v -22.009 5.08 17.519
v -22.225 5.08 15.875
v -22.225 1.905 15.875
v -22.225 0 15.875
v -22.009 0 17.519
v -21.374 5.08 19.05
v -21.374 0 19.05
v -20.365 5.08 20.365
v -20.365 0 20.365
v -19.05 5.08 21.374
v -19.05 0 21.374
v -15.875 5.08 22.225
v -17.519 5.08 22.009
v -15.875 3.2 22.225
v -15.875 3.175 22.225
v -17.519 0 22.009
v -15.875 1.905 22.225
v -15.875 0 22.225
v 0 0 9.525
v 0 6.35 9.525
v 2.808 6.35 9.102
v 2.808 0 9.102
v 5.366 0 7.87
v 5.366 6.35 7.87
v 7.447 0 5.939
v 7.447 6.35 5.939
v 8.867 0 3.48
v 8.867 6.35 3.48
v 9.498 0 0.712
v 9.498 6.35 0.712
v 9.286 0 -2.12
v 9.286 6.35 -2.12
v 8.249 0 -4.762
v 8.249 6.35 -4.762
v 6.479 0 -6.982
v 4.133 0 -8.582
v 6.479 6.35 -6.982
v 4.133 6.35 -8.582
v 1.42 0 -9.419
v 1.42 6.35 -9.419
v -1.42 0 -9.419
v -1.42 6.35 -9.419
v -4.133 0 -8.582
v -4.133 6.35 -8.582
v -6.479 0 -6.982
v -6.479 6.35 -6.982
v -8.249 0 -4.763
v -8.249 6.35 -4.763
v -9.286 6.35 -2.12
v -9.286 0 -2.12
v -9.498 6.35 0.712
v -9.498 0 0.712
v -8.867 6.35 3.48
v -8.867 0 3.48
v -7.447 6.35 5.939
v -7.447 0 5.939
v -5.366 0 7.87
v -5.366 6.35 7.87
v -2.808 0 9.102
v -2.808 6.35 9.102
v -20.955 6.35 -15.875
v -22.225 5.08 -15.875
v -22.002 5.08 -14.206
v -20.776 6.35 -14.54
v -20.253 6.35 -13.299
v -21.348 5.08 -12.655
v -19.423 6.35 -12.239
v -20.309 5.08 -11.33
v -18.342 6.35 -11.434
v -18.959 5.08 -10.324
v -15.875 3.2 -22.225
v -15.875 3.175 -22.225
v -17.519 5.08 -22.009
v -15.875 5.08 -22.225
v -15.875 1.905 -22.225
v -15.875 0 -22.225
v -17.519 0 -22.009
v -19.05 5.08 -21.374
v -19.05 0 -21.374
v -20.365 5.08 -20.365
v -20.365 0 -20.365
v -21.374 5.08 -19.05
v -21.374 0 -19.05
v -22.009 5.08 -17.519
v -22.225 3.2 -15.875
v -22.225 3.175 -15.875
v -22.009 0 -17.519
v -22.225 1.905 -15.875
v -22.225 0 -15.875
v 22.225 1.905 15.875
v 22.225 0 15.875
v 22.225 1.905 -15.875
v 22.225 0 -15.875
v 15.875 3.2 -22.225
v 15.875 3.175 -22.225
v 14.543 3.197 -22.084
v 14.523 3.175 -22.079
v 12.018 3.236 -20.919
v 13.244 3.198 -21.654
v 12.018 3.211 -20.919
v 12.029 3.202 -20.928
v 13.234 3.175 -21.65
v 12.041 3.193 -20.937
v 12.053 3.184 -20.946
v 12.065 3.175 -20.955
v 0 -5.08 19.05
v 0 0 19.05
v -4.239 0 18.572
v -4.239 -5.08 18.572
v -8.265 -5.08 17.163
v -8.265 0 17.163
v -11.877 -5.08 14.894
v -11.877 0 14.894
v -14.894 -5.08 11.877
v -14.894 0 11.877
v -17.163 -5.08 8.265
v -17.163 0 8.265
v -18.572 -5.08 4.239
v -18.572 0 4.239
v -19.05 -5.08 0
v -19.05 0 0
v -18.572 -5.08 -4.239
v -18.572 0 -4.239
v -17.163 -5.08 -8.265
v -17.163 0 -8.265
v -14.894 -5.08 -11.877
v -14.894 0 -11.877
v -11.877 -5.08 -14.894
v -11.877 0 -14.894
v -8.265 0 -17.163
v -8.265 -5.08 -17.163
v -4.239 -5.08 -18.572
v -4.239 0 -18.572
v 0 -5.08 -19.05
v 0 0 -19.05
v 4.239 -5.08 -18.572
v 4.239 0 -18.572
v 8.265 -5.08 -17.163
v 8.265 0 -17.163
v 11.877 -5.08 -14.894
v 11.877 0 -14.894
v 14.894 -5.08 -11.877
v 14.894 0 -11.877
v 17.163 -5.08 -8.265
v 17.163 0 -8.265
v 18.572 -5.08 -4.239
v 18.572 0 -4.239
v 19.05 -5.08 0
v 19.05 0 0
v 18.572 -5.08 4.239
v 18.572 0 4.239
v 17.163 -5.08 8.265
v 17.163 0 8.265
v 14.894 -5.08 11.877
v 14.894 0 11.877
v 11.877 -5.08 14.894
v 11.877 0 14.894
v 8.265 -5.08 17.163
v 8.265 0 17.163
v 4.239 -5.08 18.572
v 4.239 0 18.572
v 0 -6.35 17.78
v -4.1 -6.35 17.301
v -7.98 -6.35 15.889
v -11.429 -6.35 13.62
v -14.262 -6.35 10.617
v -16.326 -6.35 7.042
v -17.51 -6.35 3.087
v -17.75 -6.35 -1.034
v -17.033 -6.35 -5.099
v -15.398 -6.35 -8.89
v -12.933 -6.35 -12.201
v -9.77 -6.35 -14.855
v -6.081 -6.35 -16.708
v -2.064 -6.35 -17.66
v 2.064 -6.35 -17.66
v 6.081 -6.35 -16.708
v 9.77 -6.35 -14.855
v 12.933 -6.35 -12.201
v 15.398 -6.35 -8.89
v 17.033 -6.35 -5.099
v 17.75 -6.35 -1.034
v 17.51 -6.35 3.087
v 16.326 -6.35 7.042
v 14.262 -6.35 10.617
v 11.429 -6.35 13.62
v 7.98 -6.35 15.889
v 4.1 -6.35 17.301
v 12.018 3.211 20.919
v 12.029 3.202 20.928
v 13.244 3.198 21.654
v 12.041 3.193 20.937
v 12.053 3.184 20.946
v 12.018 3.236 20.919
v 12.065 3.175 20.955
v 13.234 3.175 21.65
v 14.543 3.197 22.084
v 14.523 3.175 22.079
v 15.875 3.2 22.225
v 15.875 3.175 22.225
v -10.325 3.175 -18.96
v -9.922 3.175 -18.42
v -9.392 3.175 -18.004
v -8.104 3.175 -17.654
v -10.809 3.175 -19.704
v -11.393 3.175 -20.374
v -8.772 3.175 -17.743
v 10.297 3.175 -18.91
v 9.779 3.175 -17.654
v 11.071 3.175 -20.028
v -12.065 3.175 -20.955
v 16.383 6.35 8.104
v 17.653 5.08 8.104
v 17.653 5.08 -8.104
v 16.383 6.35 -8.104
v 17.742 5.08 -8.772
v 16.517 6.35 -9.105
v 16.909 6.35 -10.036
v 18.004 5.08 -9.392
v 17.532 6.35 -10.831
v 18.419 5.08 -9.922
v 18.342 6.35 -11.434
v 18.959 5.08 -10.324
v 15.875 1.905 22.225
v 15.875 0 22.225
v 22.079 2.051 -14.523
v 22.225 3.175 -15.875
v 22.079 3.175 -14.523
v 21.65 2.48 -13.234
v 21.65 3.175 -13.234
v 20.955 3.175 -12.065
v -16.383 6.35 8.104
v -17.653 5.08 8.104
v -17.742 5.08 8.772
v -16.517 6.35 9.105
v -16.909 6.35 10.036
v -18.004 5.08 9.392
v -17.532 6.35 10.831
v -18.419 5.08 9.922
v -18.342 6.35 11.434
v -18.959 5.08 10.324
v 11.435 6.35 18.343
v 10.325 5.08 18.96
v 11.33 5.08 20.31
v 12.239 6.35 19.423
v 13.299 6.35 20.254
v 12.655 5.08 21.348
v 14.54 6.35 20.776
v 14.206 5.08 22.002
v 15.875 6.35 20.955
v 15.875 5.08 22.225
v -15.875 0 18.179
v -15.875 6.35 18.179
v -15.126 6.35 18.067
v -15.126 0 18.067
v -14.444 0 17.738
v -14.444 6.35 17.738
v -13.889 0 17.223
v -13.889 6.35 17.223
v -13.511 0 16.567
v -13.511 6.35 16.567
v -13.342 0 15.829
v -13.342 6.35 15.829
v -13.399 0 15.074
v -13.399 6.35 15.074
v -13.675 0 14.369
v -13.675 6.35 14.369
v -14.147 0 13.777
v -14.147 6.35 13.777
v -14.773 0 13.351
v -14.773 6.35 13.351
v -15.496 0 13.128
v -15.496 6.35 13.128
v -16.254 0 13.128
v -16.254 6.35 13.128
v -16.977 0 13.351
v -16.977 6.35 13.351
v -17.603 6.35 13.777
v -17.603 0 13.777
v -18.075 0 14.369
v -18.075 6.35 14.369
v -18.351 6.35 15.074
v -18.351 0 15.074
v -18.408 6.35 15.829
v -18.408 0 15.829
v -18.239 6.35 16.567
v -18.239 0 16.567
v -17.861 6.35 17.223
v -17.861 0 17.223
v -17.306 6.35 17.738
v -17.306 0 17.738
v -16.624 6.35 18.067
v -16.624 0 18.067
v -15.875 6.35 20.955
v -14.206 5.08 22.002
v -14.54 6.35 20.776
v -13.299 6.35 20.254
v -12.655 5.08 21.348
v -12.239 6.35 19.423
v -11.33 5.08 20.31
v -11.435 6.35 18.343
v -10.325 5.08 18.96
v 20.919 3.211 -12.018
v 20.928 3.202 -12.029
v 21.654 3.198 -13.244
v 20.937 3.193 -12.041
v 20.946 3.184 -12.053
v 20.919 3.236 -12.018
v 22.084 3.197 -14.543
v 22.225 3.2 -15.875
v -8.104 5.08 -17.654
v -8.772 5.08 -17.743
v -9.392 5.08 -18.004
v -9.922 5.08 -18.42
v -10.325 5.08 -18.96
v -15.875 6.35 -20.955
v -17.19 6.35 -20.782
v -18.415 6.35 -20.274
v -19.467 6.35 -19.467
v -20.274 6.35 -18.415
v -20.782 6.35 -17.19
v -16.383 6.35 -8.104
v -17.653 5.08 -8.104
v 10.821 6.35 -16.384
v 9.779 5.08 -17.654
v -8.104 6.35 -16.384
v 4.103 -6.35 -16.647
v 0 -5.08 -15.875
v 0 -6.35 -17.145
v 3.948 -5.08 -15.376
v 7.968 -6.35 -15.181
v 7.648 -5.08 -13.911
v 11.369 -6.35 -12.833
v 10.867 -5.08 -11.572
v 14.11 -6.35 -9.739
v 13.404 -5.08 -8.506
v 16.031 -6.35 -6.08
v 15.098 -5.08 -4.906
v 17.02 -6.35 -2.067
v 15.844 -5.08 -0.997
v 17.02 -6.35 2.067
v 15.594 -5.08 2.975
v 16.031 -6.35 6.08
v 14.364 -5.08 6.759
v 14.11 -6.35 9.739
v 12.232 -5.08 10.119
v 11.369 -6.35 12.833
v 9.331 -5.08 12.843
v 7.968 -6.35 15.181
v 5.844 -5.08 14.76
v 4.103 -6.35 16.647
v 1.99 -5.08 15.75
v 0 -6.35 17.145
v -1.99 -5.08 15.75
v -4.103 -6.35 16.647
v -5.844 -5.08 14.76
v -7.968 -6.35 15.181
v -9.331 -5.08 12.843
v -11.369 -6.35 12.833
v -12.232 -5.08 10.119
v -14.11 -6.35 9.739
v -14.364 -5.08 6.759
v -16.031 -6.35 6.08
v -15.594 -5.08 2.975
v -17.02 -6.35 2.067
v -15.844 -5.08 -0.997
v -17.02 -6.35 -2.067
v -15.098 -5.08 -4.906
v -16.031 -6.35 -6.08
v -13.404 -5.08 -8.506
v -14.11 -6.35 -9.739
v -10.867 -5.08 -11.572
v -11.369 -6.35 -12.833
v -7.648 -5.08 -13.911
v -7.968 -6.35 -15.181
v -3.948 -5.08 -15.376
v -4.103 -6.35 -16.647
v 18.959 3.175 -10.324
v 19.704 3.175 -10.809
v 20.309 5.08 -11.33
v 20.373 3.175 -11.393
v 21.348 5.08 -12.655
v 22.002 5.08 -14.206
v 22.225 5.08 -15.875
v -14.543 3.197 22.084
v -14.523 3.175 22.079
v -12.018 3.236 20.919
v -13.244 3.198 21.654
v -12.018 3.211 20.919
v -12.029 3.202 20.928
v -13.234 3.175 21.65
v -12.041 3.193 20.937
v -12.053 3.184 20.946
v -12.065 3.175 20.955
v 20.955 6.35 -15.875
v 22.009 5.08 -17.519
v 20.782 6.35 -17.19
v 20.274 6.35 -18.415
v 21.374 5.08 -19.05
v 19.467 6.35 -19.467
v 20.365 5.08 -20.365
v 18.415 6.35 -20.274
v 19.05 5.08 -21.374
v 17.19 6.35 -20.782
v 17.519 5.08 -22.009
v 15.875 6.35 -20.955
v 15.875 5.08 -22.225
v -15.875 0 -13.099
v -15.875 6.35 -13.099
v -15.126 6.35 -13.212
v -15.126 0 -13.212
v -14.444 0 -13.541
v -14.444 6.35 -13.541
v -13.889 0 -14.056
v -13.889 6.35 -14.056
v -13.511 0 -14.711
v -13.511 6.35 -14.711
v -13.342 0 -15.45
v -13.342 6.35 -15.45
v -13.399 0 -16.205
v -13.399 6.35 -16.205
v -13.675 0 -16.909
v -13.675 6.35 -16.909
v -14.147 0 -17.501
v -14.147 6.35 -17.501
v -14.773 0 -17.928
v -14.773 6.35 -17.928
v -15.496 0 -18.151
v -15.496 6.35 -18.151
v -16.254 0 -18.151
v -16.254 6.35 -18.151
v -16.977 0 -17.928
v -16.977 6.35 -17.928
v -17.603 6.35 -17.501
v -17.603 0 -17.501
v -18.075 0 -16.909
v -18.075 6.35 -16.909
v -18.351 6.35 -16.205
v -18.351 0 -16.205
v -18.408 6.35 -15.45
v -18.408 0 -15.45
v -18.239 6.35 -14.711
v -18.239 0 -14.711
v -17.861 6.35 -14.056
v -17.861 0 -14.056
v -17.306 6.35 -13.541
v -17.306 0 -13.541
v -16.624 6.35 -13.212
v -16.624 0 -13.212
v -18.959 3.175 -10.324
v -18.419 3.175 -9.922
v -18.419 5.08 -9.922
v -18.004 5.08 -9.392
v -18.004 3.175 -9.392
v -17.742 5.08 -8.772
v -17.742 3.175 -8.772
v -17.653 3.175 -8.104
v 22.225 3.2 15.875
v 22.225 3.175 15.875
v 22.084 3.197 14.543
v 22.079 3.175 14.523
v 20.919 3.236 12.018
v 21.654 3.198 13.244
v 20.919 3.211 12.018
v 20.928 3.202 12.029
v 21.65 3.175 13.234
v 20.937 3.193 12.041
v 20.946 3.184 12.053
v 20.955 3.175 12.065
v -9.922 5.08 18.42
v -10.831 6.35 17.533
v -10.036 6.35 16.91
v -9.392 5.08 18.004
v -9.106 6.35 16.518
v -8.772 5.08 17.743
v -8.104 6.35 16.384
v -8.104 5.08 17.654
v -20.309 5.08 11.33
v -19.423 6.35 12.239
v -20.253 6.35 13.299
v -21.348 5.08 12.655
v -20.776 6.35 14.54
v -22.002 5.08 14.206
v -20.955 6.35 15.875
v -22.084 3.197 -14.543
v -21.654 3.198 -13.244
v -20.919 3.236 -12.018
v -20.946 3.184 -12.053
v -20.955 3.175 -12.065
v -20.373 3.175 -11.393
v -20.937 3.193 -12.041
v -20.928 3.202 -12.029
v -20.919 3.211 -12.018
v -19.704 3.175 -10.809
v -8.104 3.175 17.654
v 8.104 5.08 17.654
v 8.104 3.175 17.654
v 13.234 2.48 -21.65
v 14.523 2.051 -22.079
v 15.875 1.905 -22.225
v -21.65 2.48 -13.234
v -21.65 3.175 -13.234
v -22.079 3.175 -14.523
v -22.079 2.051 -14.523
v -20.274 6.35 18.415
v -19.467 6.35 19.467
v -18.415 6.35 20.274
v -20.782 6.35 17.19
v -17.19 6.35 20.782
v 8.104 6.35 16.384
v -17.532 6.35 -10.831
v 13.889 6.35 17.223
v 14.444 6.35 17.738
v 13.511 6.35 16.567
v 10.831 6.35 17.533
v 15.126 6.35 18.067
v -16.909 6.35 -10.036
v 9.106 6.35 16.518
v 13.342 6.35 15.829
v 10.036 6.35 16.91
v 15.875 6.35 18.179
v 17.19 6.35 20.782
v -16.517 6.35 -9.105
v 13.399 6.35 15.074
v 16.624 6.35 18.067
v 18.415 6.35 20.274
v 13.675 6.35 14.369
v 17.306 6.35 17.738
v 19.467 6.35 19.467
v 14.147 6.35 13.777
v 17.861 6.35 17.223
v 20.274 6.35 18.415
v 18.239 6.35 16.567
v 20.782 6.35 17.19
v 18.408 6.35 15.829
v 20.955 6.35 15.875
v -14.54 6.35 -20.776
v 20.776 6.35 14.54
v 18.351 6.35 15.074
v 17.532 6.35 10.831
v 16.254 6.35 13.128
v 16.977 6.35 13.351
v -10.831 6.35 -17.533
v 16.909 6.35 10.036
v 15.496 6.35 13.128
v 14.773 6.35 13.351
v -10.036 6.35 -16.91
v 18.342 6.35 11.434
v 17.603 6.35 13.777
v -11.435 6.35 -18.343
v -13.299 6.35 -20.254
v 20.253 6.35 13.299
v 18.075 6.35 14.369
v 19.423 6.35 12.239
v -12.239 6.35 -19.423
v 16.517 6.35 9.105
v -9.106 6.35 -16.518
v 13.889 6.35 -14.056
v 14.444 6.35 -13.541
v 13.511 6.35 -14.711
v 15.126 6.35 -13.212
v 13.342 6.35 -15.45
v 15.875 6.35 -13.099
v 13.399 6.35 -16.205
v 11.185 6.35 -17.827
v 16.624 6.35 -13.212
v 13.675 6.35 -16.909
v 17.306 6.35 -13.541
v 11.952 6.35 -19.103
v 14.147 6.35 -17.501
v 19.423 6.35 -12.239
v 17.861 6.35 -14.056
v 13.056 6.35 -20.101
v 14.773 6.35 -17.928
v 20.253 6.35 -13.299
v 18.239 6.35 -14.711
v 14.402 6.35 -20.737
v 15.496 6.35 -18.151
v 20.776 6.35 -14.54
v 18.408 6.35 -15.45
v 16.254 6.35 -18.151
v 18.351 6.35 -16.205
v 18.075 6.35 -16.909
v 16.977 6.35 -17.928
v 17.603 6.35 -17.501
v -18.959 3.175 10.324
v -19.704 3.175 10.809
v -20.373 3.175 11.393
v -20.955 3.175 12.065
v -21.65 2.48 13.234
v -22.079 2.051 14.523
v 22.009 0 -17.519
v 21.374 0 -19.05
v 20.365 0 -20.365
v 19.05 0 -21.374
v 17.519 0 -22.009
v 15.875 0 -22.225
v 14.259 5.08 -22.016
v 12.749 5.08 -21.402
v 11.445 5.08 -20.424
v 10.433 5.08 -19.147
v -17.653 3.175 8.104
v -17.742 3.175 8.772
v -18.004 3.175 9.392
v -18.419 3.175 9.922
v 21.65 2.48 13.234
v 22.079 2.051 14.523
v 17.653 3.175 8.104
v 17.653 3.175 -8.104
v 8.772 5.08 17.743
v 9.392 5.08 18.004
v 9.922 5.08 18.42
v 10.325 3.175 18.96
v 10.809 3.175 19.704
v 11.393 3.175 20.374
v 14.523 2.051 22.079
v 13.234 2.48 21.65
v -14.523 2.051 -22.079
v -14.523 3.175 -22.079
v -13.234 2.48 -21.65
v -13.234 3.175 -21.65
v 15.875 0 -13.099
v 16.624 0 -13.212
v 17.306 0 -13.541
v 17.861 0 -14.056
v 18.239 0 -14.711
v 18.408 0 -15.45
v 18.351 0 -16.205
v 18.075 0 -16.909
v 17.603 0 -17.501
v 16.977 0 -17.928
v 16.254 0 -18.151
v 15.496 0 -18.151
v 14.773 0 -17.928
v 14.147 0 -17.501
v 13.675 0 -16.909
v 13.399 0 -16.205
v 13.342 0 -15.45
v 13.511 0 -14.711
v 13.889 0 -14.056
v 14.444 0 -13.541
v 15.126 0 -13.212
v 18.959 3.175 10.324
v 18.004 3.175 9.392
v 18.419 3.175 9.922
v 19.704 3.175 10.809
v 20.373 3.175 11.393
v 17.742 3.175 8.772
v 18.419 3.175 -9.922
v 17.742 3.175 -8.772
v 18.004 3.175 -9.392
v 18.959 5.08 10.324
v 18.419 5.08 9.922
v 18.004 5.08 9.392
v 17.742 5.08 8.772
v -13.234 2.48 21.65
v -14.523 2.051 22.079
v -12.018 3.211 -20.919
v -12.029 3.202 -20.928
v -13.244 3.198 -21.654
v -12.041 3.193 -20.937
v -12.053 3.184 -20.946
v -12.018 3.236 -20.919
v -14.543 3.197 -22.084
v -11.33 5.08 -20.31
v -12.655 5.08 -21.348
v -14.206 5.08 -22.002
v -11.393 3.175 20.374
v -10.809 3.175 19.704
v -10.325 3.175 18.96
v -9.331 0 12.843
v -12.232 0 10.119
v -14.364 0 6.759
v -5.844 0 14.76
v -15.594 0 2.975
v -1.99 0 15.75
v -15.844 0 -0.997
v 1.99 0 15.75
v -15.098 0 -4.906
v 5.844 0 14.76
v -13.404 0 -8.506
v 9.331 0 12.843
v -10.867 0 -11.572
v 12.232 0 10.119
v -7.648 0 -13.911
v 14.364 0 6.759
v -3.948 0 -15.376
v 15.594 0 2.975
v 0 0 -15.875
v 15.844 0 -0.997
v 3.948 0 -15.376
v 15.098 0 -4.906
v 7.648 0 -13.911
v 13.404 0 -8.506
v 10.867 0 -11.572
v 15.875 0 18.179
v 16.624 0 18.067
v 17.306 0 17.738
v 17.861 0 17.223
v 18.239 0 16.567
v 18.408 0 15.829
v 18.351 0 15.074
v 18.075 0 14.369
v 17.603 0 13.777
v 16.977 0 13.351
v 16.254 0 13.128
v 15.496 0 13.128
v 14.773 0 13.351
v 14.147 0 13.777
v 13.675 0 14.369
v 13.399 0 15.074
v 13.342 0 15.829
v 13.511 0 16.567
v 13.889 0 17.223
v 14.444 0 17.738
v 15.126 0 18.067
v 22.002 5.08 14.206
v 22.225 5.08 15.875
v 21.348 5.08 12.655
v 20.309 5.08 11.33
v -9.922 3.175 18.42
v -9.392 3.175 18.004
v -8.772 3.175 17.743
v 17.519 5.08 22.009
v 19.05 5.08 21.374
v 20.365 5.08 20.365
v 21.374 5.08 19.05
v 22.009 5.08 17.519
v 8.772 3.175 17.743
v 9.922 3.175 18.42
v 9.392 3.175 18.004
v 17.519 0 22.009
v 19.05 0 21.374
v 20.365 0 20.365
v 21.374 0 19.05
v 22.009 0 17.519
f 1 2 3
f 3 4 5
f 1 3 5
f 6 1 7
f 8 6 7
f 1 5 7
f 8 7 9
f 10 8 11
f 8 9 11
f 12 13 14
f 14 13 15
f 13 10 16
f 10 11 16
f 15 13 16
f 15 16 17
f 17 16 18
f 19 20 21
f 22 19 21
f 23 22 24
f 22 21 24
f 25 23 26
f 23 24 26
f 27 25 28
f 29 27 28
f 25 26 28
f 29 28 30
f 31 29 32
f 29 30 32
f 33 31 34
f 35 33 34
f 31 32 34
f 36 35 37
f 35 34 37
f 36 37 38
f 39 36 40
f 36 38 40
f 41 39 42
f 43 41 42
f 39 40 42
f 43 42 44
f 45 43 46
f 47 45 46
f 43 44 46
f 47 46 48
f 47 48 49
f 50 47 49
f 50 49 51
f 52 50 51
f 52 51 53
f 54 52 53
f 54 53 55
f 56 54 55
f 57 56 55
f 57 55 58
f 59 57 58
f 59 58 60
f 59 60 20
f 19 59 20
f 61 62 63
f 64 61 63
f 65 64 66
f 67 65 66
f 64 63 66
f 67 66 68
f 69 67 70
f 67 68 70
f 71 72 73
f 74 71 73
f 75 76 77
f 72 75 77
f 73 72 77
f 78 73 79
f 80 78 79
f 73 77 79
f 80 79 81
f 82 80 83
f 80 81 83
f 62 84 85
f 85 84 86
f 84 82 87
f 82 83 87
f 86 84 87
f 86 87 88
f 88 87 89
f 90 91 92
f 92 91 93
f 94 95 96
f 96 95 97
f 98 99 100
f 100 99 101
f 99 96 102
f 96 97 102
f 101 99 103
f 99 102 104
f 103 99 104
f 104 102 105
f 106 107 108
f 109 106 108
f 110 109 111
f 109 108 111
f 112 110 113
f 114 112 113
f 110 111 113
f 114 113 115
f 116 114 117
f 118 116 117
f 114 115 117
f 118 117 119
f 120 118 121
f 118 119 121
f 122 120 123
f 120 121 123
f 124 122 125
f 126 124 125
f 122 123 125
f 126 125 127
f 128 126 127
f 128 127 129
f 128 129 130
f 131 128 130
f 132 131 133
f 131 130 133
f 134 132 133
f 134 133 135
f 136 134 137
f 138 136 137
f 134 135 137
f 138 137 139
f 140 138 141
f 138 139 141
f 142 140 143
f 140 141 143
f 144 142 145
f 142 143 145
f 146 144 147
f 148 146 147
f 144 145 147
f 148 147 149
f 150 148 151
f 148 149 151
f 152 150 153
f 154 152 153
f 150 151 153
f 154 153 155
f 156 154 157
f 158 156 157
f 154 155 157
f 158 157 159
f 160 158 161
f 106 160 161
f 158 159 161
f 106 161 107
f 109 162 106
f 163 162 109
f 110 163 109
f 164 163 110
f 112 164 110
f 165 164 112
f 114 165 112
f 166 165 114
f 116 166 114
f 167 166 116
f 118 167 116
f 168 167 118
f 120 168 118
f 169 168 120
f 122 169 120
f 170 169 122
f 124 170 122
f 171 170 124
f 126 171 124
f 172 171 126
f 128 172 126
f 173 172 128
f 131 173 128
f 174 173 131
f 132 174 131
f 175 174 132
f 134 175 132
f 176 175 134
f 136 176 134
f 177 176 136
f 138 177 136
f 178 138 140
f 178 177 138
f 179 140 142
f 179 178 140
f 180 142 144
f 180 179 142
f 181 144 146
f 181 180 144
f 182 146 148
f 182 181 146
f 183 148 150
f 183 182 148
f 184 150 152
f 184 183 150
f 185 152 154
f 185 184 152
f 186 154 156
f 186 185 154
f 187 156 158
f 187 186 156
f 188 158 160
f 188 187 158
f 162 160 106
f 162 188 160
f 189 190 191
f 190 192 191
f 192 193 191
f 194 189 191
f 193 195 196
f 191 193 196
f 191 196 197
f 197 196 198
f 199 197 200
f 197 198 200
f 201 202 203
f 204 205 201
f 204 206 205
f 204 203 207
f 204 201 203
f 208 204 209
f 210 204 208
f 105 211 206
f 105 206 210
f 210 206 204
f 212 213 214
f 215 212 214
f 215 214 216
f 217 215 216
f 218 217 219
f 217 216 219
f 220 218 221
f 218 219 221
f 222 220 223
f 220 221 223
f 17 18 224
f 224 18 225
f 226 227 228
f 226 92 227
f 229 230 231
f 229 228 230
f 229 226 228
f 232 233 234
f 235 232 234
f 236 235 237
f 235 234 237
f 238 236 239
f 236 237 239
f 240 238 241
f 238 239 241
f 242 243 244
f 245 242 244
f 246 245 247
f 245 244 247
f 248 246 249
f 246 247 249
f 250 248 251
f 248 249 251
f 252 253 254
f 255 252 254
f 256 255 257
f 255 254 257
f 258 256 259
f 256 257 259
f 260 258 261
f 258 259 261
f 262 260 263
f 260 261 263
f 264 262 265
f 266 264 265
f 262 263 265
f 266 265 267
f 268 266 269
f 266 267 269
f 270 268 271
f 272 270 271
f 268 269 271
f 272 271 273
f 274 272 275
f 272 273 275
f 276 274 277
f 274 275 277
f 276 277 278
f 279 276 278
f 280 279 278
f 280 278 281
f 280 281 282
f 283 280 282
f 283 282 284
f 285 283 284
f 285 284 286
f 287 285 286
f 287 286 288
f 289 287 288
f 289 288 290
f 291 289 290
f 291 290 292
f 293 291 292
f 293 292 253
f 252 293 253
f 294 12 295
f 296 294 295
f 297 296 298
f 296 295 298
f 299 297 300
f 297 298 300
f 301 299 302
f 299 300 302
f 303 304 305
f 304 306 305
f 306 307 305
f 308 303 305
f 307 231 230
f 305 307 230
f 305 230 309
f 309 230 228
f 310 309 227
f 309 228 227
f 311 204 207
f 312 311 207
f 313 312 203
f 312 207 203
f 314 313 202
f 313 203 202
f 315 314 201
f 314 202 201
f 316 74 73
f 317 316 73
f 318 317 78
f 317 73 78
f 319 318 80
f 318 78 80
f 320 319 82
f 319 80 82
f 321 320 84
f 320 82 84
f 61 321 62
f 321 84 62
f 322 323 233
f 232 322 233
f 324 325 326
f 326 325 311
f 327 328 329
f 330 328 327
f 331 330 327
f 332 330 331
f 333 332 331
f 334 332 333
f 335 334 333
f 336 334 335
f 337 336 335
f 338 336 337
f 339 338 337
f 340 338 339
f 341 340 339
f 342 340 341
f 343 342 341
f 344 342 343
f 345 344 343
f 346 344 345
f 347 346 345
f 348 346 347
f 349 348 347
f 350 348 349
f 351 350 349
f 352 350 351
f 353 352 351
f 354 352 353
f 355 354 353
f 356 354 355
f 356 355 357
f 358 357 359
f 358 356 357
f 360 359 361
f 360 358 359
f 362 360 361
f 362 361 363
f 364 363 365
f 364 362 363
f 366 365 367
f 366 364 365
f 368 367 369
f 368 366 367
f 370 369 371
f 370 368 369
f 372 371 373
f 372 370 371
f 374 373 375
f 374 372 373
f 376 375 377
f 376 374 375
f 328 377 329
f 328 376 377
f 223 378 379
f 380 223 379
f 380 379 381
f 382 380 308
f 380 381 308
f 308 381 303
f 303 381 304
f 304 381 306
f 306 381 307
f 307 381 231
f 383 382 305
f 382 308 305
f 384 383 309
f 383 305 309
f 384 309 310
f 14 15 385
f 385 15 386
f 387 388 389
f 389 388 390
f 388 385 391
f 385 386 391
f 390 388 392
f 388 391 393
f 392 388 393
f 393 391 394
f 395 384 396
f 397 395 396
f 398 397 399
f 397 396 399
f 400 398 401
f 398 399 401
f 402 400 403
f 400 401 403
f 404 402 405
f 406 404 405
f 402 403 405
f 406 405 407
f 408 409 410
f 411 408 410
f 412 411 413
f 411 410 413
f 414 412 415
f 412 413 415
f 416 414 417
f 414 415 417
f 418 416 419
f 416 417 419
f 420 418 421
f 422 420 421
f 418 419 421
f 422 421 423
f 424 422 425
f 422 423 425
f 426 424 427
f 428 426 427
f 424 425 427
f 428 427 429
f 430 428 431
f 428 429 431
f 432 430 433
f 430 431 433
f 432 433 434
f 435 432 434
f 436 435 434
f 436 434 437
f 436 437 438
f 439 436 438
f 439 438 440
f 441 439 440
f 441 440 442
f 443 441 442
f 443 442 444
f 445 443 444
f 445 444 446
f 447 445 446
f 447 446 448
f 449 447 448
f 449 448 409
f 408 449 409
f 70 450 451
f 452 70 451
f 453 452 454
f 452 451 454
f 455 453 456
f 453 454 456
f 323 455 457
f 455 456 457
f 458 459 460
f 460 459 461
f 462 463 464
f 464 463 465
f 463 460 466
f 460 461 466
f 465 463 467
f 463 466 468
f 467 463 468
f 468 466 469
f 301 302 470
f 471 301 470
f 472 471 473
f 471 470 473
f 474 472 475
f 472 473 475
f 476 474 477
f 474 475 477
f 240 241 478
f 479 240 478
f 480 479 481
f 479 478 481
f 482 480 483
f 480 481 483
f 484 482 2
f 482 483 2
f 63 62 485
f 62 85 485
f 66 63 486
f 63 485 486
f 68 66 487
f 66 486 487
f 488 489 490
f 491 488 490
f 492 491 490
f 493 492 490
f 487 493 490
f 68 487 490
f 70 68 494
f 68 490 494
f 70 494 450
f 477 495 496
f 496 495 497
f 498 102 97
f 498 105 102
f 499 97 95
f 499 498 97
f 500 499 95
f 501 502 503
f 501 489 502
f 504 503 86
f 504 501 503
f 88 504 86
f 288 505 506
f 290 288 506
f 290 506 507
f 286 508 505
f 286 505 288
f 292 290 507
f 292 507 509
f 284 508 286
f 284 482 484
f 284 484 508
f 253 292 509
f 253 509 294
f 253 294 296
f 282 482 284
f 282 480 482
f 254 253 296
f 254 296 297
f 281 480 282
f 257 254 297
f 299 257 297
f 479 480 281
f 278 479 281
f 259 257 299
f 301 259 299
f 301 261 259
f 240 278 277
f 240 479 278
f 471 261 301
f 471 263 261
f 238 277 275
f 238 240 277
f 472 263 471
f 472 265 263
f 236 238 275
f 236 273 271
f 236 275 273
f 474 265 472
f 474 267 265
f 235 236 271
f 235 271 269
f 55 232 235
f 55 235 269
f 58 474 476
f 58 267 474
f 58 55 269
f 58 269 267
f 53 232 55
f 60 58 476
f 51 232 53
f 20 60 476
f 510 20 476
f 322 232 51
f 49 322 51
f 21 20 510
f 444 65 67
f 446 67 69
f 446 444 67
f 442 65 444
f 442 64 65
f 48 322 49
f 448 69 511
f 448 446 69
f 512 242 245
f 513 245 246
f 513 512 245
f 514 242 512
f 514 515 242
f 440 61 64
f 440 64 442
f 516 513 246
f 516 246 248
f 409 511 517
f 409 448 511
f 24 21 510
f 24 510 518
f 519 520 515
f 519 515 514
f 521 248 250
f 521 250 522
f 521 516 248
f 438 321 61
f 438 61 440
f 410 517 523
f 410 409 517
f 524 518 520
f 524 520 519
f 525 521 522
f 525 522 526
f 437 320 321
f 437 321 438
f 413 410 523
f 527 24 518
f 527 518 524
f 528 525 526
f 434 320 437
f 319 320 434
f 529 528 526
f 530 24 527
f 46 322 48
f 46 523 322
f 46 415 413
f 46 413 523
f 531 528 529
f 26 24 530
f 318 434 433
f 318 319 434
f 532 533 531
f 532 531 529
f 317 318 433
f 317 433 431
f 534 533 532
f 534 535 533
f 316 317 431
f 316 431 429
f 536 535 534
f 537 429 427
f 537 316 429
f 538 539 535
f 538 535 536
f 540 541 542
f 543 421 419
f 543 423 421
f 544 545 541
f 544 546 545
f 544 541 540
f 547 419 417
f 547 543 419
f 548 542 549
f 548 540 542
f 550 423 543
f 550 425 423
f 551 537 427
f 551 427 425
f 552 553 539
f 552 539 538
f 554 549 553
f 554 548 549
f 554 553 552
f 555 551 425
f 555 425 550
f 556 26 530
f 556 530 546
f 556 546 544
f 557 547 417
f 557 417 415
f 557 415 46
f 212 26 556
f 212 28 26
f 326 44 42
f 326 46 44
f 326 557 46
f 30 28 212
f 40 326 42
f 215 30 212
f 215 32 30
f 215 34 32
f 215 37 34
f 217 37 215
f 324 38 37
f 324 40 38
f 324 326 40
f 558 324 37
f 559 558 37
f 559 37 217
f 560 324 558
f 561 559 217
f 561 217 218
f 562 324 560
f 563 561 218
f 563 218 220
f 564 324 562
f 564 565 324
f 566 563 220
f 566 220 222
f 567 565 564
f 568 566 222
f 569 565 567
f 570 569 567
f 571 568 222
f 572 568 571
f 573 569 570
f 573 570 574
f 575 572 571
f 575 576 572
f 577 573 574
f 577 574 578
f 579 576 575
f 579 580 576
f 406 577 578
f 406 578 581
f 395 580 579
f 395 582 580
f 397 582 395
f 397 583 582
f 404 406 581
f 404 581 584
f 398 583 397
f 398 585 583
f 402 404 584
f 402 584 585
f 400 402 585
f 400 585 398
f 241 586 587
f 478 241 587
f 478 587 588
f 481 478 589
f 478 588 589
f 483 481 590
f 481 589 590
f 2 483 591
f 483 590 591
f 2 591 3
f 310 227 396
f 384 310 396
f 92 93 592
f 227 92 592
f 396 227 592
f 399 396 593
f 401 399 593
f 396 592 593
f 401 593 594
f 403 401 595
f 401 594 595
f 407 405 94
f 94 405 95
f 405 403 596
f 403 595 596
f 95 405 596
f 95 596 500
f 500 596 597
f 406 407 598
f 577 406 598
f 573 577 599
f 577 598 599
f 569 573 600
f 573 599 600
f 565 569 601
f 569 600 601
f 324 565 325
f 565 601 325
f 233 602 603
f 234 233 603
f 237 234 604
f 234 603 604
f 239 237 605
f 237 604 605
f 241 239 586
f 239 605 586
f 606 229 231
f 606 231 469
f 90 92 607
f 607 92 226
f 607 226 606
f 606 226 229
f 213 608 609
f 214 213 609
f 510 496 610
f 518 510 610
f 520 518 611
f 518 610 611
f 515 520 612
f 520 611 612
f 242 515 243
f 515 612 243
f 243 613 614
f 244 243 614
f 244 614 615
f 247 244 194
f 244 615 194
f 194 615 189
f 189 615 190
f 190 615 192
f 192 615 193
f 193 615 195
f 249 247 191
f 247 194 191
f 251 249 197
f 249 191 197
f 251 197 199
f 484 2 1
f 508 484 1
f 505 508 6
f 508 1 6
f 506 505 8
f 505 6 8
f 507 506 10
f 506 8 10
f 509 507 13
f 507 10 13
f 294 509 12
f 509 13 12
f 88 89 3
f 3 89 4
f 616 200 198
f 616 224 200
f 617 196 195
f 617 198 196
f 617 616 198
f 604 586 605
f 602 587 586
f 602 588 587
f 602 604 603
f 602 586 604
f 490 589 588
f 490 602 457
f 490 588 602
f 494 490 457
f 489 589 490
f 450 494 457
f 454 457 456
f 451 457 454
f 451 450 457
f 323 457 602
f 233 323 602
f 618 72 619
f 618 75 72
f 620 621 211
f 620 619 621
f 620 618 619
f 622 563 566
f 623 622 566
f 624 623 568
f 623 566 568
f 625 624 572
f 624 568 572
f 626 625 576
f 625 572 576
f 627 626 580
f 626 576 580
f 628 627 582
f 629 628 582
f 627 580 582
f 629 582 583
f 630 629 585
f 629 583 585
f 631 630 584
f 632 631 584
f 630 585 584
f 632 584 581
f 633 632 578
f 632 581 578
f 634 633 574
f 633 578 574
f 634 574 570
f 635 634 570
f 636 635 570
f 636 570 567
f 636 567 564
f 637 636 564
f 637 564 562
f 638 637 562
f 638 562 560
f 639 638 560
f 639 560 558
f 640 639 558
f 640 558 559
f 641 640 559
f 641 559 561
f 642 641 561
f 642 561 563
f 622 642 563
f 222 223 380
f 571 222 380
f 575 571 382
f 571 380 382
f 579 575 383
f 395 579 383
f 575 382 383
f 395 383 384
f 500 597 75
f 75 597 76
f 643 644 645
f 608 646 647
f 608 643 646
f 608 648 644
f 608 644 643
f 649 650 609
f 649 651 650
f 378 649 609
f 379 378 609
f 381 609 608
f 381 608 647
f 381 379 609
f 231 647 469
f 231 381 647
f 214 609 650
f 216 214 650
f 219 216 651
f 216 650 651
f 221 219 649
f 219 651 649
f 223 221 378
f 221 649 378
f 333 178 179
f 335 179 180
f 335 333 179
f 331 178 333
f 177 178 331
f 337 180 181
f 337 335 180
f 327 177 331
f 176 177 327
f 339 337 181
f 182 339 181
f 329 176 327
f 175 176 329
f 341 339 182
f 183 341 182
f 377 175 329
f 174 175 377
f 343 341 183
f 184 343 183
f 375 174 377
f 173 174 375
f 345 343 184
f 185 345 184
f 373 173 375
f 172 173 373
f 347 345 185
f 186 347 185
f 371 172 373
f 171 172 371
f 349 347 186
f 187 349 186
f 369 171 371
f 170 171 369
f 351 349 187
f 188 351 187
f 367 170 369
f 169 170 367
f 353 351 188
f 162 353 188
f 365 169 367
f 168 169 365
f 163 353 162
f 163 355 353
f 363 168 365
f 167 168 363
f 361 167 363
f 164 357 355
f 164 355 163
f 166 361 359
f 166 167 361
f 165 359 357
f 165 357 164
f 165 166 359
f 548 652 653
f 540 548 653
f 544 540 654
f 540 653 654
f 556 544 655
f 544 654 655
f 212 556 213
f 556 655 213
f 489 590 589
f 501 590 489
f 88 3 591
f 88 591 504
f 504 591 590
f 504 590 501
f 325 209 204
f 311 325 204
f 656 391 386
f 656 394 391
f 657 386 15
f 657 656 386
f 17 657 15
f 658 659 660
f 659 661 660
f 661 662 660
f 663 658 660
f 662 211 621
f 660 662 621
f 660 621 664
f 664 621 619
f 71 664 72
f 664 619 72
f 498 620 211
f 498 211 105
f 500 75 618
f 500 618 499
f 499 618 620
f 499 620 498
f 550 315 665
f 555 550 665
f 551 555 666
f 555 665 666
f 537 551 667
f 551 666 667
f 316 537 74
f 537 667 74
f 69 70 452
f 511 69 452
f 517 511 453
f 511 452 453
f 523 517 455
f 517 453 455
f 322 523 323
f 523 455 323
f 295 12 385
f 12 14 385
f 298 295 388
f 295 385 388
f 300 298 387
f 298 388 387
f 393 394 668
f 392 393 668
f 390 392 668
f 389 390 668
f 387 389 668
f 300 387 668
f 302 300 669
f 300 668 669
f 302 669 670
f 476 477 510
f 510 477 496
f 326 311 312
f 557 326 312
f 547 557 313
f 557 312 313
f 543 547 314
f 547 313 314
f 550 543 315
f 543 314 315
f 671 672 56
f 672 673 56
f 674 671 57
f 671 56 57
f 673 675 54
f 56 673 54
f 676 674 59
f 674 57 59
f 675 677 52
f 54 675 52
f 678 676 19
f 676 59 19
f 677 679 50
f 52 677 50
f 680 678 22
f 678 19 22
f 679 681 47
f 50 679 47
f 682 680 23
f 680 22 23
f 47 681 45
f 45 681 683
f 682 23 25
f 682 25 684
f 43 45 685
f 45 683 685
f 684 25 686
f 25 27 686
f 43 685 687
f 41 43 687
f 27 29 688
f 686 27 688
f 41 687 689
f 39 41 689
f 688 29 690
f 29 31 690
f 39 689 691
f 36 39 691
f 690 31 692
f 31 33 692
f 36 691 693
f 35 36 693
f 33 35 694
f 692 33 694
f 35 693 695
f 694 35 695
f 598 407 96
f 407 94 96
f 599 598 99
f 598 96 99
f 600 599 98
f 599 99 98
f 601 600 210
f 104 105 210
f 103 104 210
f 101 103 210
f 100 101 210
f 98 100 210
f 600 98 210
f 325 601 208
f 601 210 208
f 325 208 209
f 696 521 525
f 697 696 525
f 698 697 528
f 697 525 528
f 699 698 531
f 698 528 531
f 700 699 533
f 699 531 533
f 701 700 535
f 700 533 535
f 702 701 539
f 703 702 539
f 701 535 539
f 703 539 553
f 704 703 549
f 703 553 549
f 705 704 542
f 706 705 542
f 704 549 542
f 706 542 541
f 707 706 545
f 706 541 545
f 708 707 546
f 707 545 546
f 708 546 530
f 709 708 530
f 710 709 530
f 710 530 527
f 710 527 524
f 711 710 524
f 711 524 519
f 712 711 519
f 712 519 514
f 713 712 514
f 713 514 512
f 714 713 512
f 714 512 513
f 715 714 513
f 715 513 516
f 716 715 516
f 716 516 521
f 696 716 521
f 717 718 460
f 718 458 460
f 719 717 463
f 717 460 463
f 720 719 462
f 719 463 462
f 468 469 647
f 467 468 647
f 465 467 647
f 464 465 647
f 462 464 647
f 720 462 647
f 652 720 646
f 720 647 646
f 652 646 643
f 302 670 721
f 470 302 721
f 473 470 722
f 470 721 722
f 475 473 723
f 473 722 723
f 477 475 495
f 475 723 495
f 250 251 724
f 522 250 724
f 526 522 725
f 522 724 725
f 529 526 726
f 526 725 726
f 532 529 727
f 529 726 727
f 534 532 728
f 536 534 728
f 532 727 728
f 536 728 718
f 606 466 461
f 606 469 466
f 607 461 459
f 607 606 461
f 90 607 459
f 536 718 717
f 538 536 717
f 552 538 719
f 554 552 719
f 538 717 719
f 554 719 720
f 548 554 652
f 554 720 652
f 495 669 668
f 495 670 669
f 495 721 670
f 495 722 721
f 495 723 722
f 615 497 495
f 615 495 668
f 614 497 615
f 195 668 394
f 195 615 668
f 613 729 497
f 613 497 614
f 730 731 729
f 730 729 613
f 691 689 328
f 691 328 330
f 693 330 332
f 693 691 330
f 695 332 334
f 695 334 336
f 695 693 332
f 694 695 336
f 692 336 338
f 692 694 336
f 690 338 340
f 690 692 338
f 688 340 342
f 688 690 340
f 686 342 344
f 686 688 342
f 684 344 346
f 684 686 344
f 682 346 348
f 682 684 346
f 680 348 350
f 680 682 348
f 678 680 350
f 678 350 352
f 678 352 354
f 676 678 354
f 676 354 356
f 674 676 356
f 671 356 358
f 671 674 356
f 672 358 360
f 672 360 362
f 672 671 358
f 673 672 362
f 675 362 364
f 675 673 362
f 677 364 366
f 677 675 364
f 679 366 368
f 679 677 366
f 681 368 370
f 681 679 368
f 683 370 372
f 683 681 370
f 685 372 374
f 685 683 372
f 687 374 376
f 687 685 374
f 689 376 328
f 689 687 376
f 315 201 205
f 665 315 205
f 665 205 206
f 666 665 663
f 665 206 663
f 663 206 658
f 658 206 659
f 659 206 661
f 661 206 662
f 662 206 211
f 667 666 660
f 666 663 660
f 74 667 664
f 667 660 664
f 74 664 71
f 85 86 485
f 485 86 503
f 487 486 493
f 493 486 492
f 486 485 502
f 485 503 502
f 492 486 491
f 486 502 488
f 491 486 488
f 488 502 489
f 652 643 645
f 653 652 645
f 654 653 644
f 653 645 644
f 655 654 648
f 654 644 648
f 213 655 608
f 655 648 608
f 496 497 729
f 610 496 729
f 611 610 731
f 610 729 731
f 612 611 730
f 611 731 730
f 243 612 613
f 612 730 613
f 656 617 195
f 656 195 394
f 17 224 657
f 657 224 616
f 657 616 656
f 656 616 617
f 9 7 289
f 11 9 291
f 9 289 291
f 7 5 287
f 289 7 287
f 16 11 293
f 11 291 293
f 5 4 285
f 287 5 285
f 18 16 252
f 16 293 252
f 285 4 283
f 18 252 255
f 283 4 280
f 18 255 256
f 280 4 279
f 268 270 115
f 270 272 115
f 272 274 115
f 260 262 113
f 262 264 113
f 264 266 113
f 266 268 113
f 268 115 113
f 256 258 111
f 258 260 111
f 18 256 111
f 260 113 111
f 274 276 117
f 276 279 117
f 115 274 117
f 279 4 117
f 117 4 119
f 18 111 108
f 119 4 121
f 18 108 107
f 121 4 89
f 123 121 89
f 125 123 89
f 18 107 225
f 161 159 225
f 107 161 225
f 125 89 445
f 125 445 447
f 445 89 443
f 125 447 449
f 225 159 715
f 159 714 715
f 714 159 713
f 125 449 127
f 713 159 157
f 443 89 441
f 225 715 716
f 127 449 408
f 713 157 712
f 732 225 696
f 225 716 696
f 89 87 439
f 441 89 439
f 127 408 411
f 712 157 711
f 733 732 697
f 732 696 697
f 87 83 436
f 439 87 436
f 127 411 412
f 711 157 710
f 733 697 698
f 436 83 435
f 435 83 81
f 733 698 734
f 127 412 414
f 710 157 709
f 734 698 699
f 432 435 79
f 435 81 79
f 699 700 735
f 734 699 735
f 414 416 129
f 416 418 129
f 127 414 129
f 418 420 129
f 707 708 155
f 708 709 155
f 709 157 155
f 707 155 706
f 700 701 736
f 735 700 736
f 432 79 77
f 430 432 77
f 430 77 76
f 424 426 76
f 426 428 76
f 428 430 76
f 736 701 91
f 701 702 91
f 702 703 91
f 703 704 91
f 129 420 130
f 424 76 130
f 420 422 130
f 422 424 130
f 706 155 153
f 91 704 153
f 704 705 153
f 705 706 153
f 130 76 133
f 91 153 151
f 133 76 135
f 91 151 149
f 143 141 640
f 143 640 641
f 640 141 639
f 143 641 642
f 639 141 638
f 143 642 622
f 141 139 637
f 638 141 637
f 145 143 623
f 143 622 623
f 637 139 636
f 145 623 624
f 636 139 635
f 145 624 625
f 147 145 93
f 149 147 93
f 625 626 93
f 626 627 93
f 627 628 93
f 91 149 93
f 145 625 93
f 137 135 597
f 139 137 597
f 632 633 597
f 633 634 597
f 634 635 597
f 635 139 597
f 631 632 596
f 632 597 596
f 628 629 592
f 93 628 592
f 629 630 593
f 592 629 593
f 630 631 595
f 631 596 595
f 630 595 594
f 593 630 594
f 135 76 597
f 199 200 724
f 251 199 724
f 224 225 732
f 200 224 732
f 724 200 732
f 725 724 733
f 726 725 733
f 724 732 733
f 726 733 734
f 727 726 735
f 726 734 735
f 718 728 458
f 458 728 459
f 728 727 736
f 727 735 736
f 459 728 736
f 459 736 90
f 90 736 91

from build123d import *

# Parameters (mm, degrees)
BOSS_EXTRUDE1_DEPTH = 3.175
BOSS_EXTRUDE2_DEPTH = 3.175
SKETCH3_R           = 19.05
SKETCH3_R_2         = 15.875
BOSS_EXTRUDE3_DEPTH = 6.35
SKETCH4_R           = 2.54
CUT_EXTRUDE1_DEPTH  = 34.89972345
CHAMFER1_SIZE       = 1.27
SKETCH5_R           = 9.525
CUT_EXTRUDE2_DEPTH  = 34.89972345


with BuildPart() as part:
    # Sketch1 → Boss-Extrude1 (new body)
    with BuildSketch(Plane(origin=(0, 0, 0), x_dir=(1, 0, 0), z_dir=(0, 1, 0))):
        with BuildLine():
            Line((-15.875, -22.225), (15.875, -22.225))
            ThreePointArc((15.875, -22.225), (20.365128061, -20.365128061), (22.225, -15.875))
            Line((22.225, -15.875), (22.225, 15.875))
            ThreePointArc((22.225, 15.875), (20.365128061, 20.365128061), (15.875, 22.225))
            Line((15.875, 22.225), (-15.875, 22.225))
            ThreePointArc((-15.875, 22.225), (-20.365128061, 20.365128061), (-22.225, 15.875))
            Line((-22.225, 15.875), (-22.225, -15.875))
            ThreePointArc((-22.225, -15.875), (-20.365128061, -20.365128061), (-15.875, -22.225))
        make_face()
    extrude(amount=BOSS_EXTRUDE1_DEPTH)

    # Sketch2 → Boss-Extrude2 (add)
    with BuildSketch(Plane(origin=(0, 3.175, 0), x_dir=(1, 0, 0), z_dir=(0, 1, 0))):
        with BuildLine():
            Line((9.779188038, 17.653644576), (-8.104452463, 17.653644576))
            ThreePointArc((-8.104452463, 17.653644576), (-9.392376749, 18.004386475), (-10.324608902, 18.959746126))
            ThreePointArc((-10.324608902, 18.959746126), (-12.655189283, 21.348145252), (-15.875, 22.225))
            ThreePointArc((-15.875, 22.225), (-20.365128061, 20.365128061), (-22.225, 15.875))
            ThreePointArc((-22.225, 15.875), (-21.348011707, 12.654962289), (-18.959285714, 10.324353044))
            ThreePointArc((-18.959285714, 10.324353044), (-18.003795317, 9.392109345), (-17.653, 8.104094261))
            Line((-17.653, 8.104094261), (-17.653, -8.104094261))
            ThreePointArc((-17.653, -8.104094261), (-18.003795317, -9.392109345), (-18.959285714, -10.324353044))
            ThreePointArc((-18.959285714, -10.324353044), (-21.348011707, -12.654962289), (-22.225, -15.875))
            ThreePointArc((-22.225, -15.875), (-20.365128061, -20.365128061), (-15.875, -22.225))
            ThreePointArc((-15.875, -22.225), (-12.655189283, -21.348145252), (-10.324608902, -18.959746126))
            ThreePointArc((-10.324608902, -18.959746126), (-9.392376749, -18.004386475), (-8.104452463, -17.653644576))
            Line((-8.104452463, -17.653644576), (8.104452463, -17.653644576))
            ThreePointArc((8.104452463, -17.653644576), (9.392376749, -18.004386475), (10.324608902, -18.959746126))
            ThreePointArc((10.324608902, -18.959746126), (12.655189283, -21.348145252), (15.875, -22.225))
            ThreePointArc((15.875, -22.225), (20.365128061, -20.365128061), (22.225, -15.875))
            ThreePointArc((22.225, -15.875), (21.348011707, -12.654962289), (18.959285714, -10.324353044))
            ThreePointArc((18.959285714, -10.324353044), (18.003795317, -9.392109345), (17.653, -8.104094261))
            Line((17.653, -8.104094261), (17.653, 8.104094261))
            ThreePointArc((17.653, 8.104094261), (18.003795317, 9.392109345), (18.959285714, 10.324353044))
            ThreePointArc((18.959285714, 10.324353044), (21.348011707, 12.654962289), (22.225, 15.875))
            ThreePointArc((22.225, 15.875), (20.365128061, 20.365128061), (15.875, 22.225))
            ThreePointArc((15.875, 22.225), (12.065268583, 20.955201426), (9.779188038, 17.653644576))
        make_face()
    extrude(amount=BOSS_EXTRUDE2_DEPTH)

    # Sketch3 → Boss-Extrude3 (add)
    with BuildSketch(Plane.XZ):
        with Locations(Location((0, 0, 0), (0, 0, 90))):
            Circle(SKETCH3_R)
        with Locations(Location((0, 0, 0), (0, 0, 270))):
            Circle(SKETCH3_R_2, mode=Mode.SUBTRACT)
    extrude(amount=BOSS_EXTRUDE3_DEPTH)

    # Sketch4 → Cut-Extrude1 (cut, through all)
    with BuildSketch(Plane(origin=(0, 6.35, 0), x_dir=(1, 0, 0), z_dir=(0, 1, 0))):
        with Locations(Location((-15.875, 15.639418556, 0), (0, 0, 270))):
            Circle(SKETCH4_R)
        with Locations(Location((15.875, 15.639418556, 0), (0, 0, 270))):
            Circle(SKETCH4_R)
        with Locations(Location((-15.875, -15.639418556, 0), (0, 0, 270))):
            Circle(SKETCH4_R)
        with Locations(Location((15.875, -15.639418556, 0), (0, 0, 270))):
            Circle(SKETCH4_R)
    extrude(amount=-CUT_EXTRUDE1_DEPTH, mode=Mode.SUBTRACT)

    # Chamfer1
    chamfer1_edges = [part.edges().sort_by_distance(p)[0] for p in [
        (-20.365314283, 6.35, -20.36494183),
        (-20.365314283, 6.35, 20.36494183),
        (-9.392376749, 6.35, -18.004386475),
        (19.836937806, 6.35, -20.837413609),
        (0.837367788, 6.35, -17.653644576),
        (18.003795317, 6.35, -9.392109345),
        (17.653, 6.35, 0),
        (18.003795317, 6.35, 9.392109345),
        (-18.003795317, 6.35, -9.392109345),
        (20.365314283, 6.35, 20.36494183),
        (-17.653, 6.35, 0),
        (9.392376749, 6.35, 18.004386475),
        (-18.003795317, 6.35, 9.392109345),
        (0, 6.35, 17.653644576),
        (-9.392376749, 6.35, 18.004386475),
    ]]
    chamfer(chamfer1_edges, length=CHAMFER1_SIZE)
    chamfer1_2_edges = [part.edges().sort_by_distance(p)[0] for p in [
        (0, -6.35, -19.05),
    ]]
    chamfer(chamfer1_2_edges, length=CHAMFER1_SIZE)
    chamfer1_3_edges = [part.edges().sort_by_distance(p)[0] for p in [
        (0, -6.35, 15.875),
    ]]
    chamfer(chamfer1_3_edges, length=CHAMFER1_SIZE)
    # the kernel refuses this chamfer: 1.27 mm, written as the material it takes off along each edge
    with BuildSketch(Plane(origin=(-22.225, 3.175, -19.141037395), x_dir=(-0.02749587661058728, -0.9996219169112966, 0), z_dir=(0, 0, 1))) as chamfer1_4_piece_1_section:
        with BuildLine():
            Line((1.306414958, 0), (-0.071814887, 1.304439598))
            Line((-0.071814887, 1.304439598), (-0.097205283, 1.303741203))
            ThreePointArc((-0.097205283, 1.303741203), (-0.043344118, 0.652015244), (-0.025390397, -0.000698395))
            Line((-0.025390397, -0.000698395), (0.000698395, -0.025390397))
            ThreePointArc((0.000698395, -0.025390397), (0.653412034, -0.007436675), (1.307113353, -0.025390397))
            Line((1.307113353, -0.025390397), (1.306414958, 0))
        make_face()
    chamfer1_4_piece_1 = extrude(amount=38.282074789, mode=Mode.PRIVATE)
    chamfer1_4_piece_1 = chamfer1_4_piece_1 - Plane(origin=(-15.875, 2.735416382, -15.875), x_dir=(0, 0, -1), z_dir=(0, -1, 0)) * Cylinder(6.35, 82, mode=Mode.PRIVATE)
    chamfer1_4_piece_1 = chamfer1_4_piece_1 - Plane(origin=(-15.875, 2.735416382, 15.875), x_dir=(-1, 0, 0), z_dir=(0, -1, 0)) * Cylinder(6.35, 82, mode=Mode.PRIVATE)
    add(chamfer1_4_piece_1, mode=Mode.SUBTRACT)
    # the kernel refuses this chamfer: 1.27 mm, written as the material it takes off along each edge
    with BuildSketch(Plane(origin=(19.141037395, 3.175, -22.225), x_dir=(0, -0.9996219169112966, -0.02749587661058728), z_dir=(-1, 0, 0))) as chamfer1_5_piece_1_section:
        with BuildLine():
            Line((1.306414958, 0), (-0.071814887, 1.304439598))
            Line((-0.071814887, 1.304439598), (-0.097205283, 1.303741203))
            ThreePointArc((-0.097205283, 1.303741203), (-0.043344118, 0.652015244), (-0.025390397, -0.000698395))
            Line((-0.025390397, -0.000698395), (0.000698395, -0.025390397))
            ThreePointArc((0.000698395, -0.025390397), (0.653412034, -0.007436675), (1.307113353, -0.025390397))
            Line((1.307113353, -0.025390397), (1.306414958, 0))
        make_face()
    chamfer1_5_piece_1 = extrude(amount=38.282074789, mode=Mode.PRIVATE)
    chamfer1_5_piece_1 = chamfer1_5_piece_1 - Plane(origin=(-15.875, 2.735416382, -15.875), x_dir=(0, 0, -1), z_dir=(0, -1, 0)) * Cylinder(6.35, 82, mode=Mode.PRIVATE)
    chamfer1_5_piece_1 = chamfer1_5_piece_1 - Plane(origin=(15.875, 2.735416382, -15.875), x_dir=(1, 0, 0), z_dir=(0, -1, 0)) * Cylinder(6.35, 82, mode=Mode.PRIVATE)
    add(chamfer1_5_piece_1, mode=Mode.SUBTRACT)
    # the kernel refuses this chamfer: 1.27 mm, written as the material it takes off along each edge
    with BuildSketch(Plane(origin=(-19.141037395, 3.175, 22.225), x_dir=(0, -0.9996219169112966, 0.02749587661058728), z_dir=(1, 0, 0))) as chamfer1_6_piece_1_section:
        with BuildLine():
            Line((1.306414958, 0), (-0.071814887, 1.304439598))
            Line((-0.071814887, 1.304439598), (-0.097205283, 1.303741203))
            ThreePointArc((-0.097205283, 1.303741203), (-0.043344118, 0.652015244), (-0.025390397, -0.000698395))
            Line((-0.025390397, -0.000698395), (0.000698395, -0.025390397))
            ThreePointArc((0.000698395, -0.025390397), (0.653412034, -0.007436675), (1.307113353, -0.025390397))
            Line((1.307113353, -0.025390397), (1.306414958, 0))
        make_face()
    chamfer1_6_piece_1 = extrude(amount=38.282074789, mode=Mode.PRIVATE)
    chamfer1_6_piece_1 = chamfer1_6_piece_1 - Plane(origin=(-15.875, 2.735416383, 15.875), x_dir=(-1, 0, 0), z_dir=(0, -1, 0)) * Cylinder(6.35, 82, mode=Mode.PRIVATE)
    chamfer1_6_piece_1 = chamfer1_6_piece_1 - Plane(origin=(15.875, 2.735416383, 15.875), x_dir=(0, 0, 1), z_dir=(0, -1, 0)) * Cylinder(6.35, 82, mode=Mode.PRIVATE)
    add(chamfer1_6_piece_1, mode=Mode.SUBTRACT)
    # the kernel refuses this chamfer: 1.27 mm, written as the material it takes off along each edge
    with BuildSketch(Plane(origin=(22.225, 3.175, 19.141037395), x_dir=(0.02749587661058728, -0.9996219169112966, 0), z_dir=(0, 0, -1))) as chamfer1_7_piece_1_section:
        with BuildLine():
            Line((1.306414958, 0), (-0.071814887, 1.304439598))
            Line((-0.071814887, 1.304439598), (-0.097205283, 1.303741203))
            ThreePointArc((-0.097205283, 1.303741203), (-0.043344118, 0.652015244), (-0.025390397, -0.000698395))
            Line((-0.025390397, -0.000698395), (0.000698395, -0.025390397))
            ThreePointArc((0.000698395, -0.025390397), (0.653412034, -0.007436675), (1.307113353, -0.025390397))
            Line((1.307113353, -0.025390397), (1.306414958, 0))
        make_face()
    chamfer1_7_piece_1 = extrude(amount=38.282074789, mode=Mode.PRIVATE)
    chamfer1_7_piece_1 = chamfer1_7_piece_1 - Plane(origin=(15.875, 2.735416383, -15.875), x_dir=(1, 0, 0), z_dir=(0, -1, 0)) * Cylinder(6.35, 82, mode=Mode.PRIVATE)
    chamfer1_7_piece_1 = chamfer1_7_piece_1 - Plane(origin=(15.875, 2.735416383, 15.875), x_dir=(0, 0, 1), z_dir=(0, -1, 0)) * Cylinder(6.35, 82, mode=Mode.PRIVATE)
    add(chamfer1_7_piece_1, mode=Mode.SUBTRACT)

    # Sketch5 → Cut-Extrude2 (cut, through all)
    with BuildSketch(Plane(origin=(0, 6.35, 0), x_dir=(1, 0, 0), z_dir=(0, 1, 0))):
        with Locations(Location((0, 0, 0), (0, 0, 270))):
            Circle(SKETCH5_R)
    extrude(amount=-CUT_EXTRUDE2_DEPTH, mode=Mode.SUBTRACT)


solid = part.part
